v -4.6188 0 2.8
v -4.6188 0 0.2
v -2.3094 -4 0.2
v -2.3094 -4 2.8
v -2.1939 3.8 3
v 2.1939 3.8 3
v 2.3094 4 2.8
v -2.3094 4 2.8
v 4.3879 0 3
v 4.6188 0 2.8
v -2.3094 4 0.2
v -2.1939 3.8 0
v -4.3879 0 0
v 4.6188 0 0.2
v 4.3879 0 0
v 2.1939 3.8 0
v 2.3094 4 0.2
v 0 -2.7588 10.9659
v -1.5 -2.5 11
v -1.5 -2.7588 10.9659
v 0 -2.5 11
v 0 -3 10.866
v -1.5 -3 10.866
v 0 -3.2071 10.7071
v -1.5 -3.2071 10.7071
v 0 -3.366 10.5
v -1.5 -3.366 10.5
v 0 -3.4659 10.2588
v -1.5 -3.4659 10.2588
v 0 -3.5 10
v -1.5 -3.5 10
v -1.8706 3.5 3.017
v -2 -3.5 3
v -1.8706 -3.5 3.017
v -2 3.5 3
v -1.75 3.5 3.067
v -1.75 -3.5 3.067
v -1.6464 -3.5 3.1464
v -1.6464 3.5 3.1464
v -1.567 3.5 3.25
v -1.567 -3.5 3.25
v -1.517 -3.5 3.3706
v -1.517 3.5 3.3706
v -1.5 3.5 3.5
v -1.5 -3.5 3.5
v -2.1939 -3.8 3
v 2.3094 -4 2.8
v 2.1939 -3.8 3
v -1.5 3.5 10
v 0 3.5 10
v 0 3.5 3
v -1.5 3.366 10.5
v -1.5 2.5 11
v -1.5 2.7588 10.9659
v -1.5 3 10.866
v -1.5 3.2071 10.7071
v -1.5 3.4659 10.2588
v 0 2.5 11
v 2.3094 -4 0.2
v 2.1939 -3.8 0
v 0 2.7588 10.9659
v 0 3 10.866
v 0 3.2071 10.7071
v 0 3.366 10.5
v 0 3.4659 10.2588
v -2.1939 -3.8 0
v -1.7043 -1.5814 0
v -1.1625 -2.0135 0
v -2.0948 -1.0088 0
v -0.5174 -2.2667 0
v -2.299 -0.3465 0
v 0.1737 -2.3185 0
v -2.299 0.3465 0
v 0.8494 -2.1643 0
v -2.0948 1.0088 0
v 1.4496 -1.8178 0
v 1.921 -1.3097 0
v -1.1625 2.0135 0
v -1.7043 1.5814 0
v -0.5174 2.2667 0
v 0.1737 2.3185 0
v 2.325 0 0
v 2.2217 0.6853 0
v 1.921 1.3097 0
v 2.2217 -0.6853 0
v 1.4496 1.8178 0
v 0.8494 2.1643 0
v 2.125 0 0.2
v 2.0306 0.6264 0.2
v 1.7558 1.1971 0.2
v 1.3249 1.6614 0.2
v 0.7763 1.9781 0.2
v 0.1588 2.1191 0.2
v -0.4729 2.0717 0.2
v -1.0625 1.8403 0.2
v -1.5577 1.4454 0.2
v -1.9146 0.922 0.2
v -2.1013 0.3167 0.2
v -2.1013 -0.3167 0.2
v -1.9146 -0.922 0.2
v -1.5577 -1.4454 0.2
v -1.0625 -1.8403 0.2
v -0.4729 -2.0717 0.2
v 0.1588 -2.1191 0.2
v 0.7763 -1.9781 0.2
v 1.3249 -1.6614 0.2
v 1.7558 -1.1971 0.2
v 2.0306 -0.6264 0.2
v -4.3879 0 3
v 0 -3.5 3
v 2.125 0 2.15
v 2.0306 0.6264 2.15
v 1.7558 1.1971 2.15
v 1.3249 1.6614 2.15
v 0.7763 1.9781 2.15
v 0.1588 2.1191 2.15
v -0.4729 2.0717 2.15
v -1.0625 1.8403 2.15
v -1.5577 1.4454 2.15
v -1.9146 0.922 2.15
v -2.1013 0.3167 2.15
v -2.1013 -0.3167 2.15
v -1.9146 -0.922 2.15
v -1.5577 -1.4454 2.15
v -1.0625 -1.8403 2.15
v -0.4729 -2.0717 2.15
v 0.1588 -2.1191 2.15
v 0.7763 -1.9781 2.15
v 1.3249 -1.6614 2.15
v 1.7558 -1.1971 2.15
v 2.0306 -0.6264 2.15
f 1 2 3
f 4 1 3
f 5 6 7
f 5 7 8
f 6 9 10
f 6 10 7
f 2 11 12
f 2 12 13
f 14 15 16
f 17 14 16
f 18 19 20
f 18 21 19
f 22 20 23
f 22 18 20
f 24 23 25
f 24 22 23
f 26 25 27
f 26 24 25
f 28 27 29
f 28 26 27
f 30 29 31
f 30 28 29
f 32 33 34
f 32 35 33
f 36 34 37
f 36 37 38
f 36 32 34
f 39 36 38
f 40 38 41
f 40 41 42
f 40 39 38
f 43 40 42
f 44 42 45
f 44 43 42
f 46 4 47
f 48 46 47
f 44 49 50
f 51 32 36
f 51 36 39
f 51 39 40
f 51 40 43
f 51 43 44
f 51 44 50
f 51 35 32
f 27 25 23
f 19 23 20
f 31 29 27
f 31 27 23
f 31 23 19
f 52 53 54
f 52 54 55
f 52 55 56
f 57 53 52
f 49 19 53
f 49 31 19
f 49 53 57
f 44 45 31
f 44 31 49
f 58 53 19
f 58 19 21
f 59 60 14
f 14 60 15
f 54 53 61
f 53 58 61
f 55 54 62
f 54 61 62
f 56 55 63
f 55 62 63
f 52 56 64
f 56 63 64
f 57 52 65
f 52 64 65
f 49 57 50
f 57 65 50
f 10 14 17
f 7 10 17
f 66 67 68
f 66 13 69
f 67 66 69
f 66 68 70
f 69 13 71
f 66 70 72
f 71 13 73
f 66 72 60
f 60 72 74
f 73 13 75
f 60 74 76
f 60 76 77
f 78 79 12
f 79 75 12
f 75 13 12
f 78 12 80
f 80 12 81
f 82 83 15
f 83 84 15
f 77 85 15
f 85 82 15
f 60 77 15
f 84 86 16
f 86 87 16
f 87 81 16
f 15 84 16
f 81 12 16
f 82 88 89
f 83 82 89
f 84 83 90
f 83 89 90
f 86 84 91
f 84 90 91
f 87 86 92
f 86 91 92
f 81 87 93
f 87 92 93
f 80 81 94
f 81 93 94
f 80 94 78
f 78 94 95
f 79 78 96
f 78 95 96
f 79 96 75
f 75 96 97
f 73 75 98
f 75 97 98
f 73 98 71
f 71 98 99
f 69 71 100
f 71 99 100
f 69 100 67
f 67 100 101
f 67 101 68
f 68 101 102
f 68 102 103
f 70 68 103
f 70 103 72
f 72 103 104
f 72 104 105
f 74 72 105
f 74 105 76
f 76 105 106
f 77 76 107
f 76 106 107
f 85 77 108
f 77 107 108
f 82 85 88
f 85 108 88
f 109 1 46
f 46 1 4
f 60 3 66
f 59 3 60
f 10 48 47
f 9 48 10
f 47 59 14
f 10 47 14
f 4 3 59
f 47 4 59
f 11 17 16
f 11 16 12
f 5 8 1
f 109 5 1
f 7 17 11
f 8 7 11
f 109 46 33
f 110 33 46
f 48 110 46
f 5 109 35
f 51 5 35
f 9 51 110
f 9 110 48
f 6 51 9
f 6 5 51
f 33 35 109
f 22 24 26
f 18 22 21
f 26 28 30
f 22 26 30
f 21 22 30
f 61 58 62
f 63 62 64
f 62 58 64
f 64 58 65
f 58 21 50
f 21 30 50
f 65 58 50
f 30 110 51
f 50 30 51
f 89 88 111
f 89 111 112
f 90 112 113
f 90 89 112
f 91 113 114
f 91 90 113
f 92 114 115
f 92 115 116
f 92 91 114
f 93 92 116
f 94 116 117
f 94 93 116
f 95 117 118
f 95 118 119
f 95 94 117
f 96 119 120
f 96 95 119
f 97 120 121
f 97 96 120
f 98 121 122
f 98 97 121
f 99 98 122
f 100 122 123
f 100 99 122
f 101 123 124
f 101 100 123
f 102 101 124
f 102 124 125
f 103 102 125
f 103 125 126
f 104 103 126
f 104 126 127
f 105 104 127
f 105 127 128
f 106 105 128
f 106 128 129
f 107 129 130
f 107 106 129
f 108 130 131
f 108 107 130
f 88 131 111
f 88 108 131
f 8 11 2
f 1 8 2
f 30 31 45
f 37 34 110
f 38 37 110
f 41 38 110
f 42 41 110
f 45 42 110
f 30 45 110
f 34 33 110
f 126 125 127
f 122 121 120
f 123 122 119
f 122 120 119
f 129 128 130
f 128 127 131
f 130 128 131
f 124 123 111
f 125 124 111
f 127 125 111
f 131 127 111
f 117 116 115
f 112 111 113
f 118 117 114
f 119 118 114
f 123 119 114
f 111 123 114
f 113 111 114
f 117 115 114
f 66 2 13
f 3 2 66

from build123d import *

# Parameters (mm, degrees)
PAD_DEPTH       = 3
SKETCH001_R     = 2.125
POCKET_DEPTH    = 2.15
CHAMFER_SIZE    = 0.2
CHAMFER001_SIZE = 0.2
SKETCH002_W     = 1.5
SKETCH002_H     = 7
PAD001_DEPTH    = 8
FILLET_R        = 0.5
FILLET001_R     = 1


with BuildPart() as part:
    # Sketch → Pad (new body)
    with BuildSketch(Plane.XY):
        Polygon((4.618802, 0), (2.309401, 4), (-2.309401, 4), (-4.618802, 0), (-2.309401, -4), (2.309401, -4), align=None)
    extrude(amount=PAD_DEPTH)

    # Sketch001 → Pocket (cut)
    with BuildSketch(Plane.XY):
        Circle(SKETCH001_R)
    extrude(amount=POCKET_DEPTH, mode=Mode.SUBTRACT)

    # Chamfer
    chamfer_edges = [part.edges().sort_by_distance(p)[0] for p in [
        (3.464102, 2, 3),
        (0, 4, 3),
        (-3.464102, 2, 3),
        (-3.464102, -2, 3),
        (0, -4, 3),
        (3.464102, -2, 3),
    ]]
    chamfer(chamfer_edges, length=CHAMFER_SIZE)

    # Chamfer001
    chamfer001_edges = [part.edges().sort_by_distance(p)[0] for p in [
        (3.464102, 2, 0),
        (3.464102, -2, 0),
        (0, 4, 0),
        (0, -4, 0),
        (-3.464102, 2, 0),
        (-3.464102, -2, 0),
        (-2.125, 0, 0),
    ]]
    chamfer(chamfer001_edges, length=CHAMFER001_SIZE)

    # Sketch002 (on Face11 of Chamfer001) → Pad001 (join)
    with BuildSketch(Plane.XY.offset(3)):
        with Locations((-0.75, 0)):
            Rectangle(SKETCH002_W, SKETCH002_H)
    extrude(amount=PAD001_DEPTH)

    # Fillet
    fillet_edges = [part.edges().sort_by_distance(p)[0] for p in [
        (-1.5, 0, 3),
    ]]
    fillet(fillet_edges, radius=FILLET_R)

    # Fillet001
    fillet001_edges = [part.edges().sort_by_distance(p)[0] for p in [
        (-0.75, -3.5, 11),
        (-0.75, 3.5, 11),
    ]]
    fillet(fillet001_edges, radius=FILLET001_R)


solid = part.part
